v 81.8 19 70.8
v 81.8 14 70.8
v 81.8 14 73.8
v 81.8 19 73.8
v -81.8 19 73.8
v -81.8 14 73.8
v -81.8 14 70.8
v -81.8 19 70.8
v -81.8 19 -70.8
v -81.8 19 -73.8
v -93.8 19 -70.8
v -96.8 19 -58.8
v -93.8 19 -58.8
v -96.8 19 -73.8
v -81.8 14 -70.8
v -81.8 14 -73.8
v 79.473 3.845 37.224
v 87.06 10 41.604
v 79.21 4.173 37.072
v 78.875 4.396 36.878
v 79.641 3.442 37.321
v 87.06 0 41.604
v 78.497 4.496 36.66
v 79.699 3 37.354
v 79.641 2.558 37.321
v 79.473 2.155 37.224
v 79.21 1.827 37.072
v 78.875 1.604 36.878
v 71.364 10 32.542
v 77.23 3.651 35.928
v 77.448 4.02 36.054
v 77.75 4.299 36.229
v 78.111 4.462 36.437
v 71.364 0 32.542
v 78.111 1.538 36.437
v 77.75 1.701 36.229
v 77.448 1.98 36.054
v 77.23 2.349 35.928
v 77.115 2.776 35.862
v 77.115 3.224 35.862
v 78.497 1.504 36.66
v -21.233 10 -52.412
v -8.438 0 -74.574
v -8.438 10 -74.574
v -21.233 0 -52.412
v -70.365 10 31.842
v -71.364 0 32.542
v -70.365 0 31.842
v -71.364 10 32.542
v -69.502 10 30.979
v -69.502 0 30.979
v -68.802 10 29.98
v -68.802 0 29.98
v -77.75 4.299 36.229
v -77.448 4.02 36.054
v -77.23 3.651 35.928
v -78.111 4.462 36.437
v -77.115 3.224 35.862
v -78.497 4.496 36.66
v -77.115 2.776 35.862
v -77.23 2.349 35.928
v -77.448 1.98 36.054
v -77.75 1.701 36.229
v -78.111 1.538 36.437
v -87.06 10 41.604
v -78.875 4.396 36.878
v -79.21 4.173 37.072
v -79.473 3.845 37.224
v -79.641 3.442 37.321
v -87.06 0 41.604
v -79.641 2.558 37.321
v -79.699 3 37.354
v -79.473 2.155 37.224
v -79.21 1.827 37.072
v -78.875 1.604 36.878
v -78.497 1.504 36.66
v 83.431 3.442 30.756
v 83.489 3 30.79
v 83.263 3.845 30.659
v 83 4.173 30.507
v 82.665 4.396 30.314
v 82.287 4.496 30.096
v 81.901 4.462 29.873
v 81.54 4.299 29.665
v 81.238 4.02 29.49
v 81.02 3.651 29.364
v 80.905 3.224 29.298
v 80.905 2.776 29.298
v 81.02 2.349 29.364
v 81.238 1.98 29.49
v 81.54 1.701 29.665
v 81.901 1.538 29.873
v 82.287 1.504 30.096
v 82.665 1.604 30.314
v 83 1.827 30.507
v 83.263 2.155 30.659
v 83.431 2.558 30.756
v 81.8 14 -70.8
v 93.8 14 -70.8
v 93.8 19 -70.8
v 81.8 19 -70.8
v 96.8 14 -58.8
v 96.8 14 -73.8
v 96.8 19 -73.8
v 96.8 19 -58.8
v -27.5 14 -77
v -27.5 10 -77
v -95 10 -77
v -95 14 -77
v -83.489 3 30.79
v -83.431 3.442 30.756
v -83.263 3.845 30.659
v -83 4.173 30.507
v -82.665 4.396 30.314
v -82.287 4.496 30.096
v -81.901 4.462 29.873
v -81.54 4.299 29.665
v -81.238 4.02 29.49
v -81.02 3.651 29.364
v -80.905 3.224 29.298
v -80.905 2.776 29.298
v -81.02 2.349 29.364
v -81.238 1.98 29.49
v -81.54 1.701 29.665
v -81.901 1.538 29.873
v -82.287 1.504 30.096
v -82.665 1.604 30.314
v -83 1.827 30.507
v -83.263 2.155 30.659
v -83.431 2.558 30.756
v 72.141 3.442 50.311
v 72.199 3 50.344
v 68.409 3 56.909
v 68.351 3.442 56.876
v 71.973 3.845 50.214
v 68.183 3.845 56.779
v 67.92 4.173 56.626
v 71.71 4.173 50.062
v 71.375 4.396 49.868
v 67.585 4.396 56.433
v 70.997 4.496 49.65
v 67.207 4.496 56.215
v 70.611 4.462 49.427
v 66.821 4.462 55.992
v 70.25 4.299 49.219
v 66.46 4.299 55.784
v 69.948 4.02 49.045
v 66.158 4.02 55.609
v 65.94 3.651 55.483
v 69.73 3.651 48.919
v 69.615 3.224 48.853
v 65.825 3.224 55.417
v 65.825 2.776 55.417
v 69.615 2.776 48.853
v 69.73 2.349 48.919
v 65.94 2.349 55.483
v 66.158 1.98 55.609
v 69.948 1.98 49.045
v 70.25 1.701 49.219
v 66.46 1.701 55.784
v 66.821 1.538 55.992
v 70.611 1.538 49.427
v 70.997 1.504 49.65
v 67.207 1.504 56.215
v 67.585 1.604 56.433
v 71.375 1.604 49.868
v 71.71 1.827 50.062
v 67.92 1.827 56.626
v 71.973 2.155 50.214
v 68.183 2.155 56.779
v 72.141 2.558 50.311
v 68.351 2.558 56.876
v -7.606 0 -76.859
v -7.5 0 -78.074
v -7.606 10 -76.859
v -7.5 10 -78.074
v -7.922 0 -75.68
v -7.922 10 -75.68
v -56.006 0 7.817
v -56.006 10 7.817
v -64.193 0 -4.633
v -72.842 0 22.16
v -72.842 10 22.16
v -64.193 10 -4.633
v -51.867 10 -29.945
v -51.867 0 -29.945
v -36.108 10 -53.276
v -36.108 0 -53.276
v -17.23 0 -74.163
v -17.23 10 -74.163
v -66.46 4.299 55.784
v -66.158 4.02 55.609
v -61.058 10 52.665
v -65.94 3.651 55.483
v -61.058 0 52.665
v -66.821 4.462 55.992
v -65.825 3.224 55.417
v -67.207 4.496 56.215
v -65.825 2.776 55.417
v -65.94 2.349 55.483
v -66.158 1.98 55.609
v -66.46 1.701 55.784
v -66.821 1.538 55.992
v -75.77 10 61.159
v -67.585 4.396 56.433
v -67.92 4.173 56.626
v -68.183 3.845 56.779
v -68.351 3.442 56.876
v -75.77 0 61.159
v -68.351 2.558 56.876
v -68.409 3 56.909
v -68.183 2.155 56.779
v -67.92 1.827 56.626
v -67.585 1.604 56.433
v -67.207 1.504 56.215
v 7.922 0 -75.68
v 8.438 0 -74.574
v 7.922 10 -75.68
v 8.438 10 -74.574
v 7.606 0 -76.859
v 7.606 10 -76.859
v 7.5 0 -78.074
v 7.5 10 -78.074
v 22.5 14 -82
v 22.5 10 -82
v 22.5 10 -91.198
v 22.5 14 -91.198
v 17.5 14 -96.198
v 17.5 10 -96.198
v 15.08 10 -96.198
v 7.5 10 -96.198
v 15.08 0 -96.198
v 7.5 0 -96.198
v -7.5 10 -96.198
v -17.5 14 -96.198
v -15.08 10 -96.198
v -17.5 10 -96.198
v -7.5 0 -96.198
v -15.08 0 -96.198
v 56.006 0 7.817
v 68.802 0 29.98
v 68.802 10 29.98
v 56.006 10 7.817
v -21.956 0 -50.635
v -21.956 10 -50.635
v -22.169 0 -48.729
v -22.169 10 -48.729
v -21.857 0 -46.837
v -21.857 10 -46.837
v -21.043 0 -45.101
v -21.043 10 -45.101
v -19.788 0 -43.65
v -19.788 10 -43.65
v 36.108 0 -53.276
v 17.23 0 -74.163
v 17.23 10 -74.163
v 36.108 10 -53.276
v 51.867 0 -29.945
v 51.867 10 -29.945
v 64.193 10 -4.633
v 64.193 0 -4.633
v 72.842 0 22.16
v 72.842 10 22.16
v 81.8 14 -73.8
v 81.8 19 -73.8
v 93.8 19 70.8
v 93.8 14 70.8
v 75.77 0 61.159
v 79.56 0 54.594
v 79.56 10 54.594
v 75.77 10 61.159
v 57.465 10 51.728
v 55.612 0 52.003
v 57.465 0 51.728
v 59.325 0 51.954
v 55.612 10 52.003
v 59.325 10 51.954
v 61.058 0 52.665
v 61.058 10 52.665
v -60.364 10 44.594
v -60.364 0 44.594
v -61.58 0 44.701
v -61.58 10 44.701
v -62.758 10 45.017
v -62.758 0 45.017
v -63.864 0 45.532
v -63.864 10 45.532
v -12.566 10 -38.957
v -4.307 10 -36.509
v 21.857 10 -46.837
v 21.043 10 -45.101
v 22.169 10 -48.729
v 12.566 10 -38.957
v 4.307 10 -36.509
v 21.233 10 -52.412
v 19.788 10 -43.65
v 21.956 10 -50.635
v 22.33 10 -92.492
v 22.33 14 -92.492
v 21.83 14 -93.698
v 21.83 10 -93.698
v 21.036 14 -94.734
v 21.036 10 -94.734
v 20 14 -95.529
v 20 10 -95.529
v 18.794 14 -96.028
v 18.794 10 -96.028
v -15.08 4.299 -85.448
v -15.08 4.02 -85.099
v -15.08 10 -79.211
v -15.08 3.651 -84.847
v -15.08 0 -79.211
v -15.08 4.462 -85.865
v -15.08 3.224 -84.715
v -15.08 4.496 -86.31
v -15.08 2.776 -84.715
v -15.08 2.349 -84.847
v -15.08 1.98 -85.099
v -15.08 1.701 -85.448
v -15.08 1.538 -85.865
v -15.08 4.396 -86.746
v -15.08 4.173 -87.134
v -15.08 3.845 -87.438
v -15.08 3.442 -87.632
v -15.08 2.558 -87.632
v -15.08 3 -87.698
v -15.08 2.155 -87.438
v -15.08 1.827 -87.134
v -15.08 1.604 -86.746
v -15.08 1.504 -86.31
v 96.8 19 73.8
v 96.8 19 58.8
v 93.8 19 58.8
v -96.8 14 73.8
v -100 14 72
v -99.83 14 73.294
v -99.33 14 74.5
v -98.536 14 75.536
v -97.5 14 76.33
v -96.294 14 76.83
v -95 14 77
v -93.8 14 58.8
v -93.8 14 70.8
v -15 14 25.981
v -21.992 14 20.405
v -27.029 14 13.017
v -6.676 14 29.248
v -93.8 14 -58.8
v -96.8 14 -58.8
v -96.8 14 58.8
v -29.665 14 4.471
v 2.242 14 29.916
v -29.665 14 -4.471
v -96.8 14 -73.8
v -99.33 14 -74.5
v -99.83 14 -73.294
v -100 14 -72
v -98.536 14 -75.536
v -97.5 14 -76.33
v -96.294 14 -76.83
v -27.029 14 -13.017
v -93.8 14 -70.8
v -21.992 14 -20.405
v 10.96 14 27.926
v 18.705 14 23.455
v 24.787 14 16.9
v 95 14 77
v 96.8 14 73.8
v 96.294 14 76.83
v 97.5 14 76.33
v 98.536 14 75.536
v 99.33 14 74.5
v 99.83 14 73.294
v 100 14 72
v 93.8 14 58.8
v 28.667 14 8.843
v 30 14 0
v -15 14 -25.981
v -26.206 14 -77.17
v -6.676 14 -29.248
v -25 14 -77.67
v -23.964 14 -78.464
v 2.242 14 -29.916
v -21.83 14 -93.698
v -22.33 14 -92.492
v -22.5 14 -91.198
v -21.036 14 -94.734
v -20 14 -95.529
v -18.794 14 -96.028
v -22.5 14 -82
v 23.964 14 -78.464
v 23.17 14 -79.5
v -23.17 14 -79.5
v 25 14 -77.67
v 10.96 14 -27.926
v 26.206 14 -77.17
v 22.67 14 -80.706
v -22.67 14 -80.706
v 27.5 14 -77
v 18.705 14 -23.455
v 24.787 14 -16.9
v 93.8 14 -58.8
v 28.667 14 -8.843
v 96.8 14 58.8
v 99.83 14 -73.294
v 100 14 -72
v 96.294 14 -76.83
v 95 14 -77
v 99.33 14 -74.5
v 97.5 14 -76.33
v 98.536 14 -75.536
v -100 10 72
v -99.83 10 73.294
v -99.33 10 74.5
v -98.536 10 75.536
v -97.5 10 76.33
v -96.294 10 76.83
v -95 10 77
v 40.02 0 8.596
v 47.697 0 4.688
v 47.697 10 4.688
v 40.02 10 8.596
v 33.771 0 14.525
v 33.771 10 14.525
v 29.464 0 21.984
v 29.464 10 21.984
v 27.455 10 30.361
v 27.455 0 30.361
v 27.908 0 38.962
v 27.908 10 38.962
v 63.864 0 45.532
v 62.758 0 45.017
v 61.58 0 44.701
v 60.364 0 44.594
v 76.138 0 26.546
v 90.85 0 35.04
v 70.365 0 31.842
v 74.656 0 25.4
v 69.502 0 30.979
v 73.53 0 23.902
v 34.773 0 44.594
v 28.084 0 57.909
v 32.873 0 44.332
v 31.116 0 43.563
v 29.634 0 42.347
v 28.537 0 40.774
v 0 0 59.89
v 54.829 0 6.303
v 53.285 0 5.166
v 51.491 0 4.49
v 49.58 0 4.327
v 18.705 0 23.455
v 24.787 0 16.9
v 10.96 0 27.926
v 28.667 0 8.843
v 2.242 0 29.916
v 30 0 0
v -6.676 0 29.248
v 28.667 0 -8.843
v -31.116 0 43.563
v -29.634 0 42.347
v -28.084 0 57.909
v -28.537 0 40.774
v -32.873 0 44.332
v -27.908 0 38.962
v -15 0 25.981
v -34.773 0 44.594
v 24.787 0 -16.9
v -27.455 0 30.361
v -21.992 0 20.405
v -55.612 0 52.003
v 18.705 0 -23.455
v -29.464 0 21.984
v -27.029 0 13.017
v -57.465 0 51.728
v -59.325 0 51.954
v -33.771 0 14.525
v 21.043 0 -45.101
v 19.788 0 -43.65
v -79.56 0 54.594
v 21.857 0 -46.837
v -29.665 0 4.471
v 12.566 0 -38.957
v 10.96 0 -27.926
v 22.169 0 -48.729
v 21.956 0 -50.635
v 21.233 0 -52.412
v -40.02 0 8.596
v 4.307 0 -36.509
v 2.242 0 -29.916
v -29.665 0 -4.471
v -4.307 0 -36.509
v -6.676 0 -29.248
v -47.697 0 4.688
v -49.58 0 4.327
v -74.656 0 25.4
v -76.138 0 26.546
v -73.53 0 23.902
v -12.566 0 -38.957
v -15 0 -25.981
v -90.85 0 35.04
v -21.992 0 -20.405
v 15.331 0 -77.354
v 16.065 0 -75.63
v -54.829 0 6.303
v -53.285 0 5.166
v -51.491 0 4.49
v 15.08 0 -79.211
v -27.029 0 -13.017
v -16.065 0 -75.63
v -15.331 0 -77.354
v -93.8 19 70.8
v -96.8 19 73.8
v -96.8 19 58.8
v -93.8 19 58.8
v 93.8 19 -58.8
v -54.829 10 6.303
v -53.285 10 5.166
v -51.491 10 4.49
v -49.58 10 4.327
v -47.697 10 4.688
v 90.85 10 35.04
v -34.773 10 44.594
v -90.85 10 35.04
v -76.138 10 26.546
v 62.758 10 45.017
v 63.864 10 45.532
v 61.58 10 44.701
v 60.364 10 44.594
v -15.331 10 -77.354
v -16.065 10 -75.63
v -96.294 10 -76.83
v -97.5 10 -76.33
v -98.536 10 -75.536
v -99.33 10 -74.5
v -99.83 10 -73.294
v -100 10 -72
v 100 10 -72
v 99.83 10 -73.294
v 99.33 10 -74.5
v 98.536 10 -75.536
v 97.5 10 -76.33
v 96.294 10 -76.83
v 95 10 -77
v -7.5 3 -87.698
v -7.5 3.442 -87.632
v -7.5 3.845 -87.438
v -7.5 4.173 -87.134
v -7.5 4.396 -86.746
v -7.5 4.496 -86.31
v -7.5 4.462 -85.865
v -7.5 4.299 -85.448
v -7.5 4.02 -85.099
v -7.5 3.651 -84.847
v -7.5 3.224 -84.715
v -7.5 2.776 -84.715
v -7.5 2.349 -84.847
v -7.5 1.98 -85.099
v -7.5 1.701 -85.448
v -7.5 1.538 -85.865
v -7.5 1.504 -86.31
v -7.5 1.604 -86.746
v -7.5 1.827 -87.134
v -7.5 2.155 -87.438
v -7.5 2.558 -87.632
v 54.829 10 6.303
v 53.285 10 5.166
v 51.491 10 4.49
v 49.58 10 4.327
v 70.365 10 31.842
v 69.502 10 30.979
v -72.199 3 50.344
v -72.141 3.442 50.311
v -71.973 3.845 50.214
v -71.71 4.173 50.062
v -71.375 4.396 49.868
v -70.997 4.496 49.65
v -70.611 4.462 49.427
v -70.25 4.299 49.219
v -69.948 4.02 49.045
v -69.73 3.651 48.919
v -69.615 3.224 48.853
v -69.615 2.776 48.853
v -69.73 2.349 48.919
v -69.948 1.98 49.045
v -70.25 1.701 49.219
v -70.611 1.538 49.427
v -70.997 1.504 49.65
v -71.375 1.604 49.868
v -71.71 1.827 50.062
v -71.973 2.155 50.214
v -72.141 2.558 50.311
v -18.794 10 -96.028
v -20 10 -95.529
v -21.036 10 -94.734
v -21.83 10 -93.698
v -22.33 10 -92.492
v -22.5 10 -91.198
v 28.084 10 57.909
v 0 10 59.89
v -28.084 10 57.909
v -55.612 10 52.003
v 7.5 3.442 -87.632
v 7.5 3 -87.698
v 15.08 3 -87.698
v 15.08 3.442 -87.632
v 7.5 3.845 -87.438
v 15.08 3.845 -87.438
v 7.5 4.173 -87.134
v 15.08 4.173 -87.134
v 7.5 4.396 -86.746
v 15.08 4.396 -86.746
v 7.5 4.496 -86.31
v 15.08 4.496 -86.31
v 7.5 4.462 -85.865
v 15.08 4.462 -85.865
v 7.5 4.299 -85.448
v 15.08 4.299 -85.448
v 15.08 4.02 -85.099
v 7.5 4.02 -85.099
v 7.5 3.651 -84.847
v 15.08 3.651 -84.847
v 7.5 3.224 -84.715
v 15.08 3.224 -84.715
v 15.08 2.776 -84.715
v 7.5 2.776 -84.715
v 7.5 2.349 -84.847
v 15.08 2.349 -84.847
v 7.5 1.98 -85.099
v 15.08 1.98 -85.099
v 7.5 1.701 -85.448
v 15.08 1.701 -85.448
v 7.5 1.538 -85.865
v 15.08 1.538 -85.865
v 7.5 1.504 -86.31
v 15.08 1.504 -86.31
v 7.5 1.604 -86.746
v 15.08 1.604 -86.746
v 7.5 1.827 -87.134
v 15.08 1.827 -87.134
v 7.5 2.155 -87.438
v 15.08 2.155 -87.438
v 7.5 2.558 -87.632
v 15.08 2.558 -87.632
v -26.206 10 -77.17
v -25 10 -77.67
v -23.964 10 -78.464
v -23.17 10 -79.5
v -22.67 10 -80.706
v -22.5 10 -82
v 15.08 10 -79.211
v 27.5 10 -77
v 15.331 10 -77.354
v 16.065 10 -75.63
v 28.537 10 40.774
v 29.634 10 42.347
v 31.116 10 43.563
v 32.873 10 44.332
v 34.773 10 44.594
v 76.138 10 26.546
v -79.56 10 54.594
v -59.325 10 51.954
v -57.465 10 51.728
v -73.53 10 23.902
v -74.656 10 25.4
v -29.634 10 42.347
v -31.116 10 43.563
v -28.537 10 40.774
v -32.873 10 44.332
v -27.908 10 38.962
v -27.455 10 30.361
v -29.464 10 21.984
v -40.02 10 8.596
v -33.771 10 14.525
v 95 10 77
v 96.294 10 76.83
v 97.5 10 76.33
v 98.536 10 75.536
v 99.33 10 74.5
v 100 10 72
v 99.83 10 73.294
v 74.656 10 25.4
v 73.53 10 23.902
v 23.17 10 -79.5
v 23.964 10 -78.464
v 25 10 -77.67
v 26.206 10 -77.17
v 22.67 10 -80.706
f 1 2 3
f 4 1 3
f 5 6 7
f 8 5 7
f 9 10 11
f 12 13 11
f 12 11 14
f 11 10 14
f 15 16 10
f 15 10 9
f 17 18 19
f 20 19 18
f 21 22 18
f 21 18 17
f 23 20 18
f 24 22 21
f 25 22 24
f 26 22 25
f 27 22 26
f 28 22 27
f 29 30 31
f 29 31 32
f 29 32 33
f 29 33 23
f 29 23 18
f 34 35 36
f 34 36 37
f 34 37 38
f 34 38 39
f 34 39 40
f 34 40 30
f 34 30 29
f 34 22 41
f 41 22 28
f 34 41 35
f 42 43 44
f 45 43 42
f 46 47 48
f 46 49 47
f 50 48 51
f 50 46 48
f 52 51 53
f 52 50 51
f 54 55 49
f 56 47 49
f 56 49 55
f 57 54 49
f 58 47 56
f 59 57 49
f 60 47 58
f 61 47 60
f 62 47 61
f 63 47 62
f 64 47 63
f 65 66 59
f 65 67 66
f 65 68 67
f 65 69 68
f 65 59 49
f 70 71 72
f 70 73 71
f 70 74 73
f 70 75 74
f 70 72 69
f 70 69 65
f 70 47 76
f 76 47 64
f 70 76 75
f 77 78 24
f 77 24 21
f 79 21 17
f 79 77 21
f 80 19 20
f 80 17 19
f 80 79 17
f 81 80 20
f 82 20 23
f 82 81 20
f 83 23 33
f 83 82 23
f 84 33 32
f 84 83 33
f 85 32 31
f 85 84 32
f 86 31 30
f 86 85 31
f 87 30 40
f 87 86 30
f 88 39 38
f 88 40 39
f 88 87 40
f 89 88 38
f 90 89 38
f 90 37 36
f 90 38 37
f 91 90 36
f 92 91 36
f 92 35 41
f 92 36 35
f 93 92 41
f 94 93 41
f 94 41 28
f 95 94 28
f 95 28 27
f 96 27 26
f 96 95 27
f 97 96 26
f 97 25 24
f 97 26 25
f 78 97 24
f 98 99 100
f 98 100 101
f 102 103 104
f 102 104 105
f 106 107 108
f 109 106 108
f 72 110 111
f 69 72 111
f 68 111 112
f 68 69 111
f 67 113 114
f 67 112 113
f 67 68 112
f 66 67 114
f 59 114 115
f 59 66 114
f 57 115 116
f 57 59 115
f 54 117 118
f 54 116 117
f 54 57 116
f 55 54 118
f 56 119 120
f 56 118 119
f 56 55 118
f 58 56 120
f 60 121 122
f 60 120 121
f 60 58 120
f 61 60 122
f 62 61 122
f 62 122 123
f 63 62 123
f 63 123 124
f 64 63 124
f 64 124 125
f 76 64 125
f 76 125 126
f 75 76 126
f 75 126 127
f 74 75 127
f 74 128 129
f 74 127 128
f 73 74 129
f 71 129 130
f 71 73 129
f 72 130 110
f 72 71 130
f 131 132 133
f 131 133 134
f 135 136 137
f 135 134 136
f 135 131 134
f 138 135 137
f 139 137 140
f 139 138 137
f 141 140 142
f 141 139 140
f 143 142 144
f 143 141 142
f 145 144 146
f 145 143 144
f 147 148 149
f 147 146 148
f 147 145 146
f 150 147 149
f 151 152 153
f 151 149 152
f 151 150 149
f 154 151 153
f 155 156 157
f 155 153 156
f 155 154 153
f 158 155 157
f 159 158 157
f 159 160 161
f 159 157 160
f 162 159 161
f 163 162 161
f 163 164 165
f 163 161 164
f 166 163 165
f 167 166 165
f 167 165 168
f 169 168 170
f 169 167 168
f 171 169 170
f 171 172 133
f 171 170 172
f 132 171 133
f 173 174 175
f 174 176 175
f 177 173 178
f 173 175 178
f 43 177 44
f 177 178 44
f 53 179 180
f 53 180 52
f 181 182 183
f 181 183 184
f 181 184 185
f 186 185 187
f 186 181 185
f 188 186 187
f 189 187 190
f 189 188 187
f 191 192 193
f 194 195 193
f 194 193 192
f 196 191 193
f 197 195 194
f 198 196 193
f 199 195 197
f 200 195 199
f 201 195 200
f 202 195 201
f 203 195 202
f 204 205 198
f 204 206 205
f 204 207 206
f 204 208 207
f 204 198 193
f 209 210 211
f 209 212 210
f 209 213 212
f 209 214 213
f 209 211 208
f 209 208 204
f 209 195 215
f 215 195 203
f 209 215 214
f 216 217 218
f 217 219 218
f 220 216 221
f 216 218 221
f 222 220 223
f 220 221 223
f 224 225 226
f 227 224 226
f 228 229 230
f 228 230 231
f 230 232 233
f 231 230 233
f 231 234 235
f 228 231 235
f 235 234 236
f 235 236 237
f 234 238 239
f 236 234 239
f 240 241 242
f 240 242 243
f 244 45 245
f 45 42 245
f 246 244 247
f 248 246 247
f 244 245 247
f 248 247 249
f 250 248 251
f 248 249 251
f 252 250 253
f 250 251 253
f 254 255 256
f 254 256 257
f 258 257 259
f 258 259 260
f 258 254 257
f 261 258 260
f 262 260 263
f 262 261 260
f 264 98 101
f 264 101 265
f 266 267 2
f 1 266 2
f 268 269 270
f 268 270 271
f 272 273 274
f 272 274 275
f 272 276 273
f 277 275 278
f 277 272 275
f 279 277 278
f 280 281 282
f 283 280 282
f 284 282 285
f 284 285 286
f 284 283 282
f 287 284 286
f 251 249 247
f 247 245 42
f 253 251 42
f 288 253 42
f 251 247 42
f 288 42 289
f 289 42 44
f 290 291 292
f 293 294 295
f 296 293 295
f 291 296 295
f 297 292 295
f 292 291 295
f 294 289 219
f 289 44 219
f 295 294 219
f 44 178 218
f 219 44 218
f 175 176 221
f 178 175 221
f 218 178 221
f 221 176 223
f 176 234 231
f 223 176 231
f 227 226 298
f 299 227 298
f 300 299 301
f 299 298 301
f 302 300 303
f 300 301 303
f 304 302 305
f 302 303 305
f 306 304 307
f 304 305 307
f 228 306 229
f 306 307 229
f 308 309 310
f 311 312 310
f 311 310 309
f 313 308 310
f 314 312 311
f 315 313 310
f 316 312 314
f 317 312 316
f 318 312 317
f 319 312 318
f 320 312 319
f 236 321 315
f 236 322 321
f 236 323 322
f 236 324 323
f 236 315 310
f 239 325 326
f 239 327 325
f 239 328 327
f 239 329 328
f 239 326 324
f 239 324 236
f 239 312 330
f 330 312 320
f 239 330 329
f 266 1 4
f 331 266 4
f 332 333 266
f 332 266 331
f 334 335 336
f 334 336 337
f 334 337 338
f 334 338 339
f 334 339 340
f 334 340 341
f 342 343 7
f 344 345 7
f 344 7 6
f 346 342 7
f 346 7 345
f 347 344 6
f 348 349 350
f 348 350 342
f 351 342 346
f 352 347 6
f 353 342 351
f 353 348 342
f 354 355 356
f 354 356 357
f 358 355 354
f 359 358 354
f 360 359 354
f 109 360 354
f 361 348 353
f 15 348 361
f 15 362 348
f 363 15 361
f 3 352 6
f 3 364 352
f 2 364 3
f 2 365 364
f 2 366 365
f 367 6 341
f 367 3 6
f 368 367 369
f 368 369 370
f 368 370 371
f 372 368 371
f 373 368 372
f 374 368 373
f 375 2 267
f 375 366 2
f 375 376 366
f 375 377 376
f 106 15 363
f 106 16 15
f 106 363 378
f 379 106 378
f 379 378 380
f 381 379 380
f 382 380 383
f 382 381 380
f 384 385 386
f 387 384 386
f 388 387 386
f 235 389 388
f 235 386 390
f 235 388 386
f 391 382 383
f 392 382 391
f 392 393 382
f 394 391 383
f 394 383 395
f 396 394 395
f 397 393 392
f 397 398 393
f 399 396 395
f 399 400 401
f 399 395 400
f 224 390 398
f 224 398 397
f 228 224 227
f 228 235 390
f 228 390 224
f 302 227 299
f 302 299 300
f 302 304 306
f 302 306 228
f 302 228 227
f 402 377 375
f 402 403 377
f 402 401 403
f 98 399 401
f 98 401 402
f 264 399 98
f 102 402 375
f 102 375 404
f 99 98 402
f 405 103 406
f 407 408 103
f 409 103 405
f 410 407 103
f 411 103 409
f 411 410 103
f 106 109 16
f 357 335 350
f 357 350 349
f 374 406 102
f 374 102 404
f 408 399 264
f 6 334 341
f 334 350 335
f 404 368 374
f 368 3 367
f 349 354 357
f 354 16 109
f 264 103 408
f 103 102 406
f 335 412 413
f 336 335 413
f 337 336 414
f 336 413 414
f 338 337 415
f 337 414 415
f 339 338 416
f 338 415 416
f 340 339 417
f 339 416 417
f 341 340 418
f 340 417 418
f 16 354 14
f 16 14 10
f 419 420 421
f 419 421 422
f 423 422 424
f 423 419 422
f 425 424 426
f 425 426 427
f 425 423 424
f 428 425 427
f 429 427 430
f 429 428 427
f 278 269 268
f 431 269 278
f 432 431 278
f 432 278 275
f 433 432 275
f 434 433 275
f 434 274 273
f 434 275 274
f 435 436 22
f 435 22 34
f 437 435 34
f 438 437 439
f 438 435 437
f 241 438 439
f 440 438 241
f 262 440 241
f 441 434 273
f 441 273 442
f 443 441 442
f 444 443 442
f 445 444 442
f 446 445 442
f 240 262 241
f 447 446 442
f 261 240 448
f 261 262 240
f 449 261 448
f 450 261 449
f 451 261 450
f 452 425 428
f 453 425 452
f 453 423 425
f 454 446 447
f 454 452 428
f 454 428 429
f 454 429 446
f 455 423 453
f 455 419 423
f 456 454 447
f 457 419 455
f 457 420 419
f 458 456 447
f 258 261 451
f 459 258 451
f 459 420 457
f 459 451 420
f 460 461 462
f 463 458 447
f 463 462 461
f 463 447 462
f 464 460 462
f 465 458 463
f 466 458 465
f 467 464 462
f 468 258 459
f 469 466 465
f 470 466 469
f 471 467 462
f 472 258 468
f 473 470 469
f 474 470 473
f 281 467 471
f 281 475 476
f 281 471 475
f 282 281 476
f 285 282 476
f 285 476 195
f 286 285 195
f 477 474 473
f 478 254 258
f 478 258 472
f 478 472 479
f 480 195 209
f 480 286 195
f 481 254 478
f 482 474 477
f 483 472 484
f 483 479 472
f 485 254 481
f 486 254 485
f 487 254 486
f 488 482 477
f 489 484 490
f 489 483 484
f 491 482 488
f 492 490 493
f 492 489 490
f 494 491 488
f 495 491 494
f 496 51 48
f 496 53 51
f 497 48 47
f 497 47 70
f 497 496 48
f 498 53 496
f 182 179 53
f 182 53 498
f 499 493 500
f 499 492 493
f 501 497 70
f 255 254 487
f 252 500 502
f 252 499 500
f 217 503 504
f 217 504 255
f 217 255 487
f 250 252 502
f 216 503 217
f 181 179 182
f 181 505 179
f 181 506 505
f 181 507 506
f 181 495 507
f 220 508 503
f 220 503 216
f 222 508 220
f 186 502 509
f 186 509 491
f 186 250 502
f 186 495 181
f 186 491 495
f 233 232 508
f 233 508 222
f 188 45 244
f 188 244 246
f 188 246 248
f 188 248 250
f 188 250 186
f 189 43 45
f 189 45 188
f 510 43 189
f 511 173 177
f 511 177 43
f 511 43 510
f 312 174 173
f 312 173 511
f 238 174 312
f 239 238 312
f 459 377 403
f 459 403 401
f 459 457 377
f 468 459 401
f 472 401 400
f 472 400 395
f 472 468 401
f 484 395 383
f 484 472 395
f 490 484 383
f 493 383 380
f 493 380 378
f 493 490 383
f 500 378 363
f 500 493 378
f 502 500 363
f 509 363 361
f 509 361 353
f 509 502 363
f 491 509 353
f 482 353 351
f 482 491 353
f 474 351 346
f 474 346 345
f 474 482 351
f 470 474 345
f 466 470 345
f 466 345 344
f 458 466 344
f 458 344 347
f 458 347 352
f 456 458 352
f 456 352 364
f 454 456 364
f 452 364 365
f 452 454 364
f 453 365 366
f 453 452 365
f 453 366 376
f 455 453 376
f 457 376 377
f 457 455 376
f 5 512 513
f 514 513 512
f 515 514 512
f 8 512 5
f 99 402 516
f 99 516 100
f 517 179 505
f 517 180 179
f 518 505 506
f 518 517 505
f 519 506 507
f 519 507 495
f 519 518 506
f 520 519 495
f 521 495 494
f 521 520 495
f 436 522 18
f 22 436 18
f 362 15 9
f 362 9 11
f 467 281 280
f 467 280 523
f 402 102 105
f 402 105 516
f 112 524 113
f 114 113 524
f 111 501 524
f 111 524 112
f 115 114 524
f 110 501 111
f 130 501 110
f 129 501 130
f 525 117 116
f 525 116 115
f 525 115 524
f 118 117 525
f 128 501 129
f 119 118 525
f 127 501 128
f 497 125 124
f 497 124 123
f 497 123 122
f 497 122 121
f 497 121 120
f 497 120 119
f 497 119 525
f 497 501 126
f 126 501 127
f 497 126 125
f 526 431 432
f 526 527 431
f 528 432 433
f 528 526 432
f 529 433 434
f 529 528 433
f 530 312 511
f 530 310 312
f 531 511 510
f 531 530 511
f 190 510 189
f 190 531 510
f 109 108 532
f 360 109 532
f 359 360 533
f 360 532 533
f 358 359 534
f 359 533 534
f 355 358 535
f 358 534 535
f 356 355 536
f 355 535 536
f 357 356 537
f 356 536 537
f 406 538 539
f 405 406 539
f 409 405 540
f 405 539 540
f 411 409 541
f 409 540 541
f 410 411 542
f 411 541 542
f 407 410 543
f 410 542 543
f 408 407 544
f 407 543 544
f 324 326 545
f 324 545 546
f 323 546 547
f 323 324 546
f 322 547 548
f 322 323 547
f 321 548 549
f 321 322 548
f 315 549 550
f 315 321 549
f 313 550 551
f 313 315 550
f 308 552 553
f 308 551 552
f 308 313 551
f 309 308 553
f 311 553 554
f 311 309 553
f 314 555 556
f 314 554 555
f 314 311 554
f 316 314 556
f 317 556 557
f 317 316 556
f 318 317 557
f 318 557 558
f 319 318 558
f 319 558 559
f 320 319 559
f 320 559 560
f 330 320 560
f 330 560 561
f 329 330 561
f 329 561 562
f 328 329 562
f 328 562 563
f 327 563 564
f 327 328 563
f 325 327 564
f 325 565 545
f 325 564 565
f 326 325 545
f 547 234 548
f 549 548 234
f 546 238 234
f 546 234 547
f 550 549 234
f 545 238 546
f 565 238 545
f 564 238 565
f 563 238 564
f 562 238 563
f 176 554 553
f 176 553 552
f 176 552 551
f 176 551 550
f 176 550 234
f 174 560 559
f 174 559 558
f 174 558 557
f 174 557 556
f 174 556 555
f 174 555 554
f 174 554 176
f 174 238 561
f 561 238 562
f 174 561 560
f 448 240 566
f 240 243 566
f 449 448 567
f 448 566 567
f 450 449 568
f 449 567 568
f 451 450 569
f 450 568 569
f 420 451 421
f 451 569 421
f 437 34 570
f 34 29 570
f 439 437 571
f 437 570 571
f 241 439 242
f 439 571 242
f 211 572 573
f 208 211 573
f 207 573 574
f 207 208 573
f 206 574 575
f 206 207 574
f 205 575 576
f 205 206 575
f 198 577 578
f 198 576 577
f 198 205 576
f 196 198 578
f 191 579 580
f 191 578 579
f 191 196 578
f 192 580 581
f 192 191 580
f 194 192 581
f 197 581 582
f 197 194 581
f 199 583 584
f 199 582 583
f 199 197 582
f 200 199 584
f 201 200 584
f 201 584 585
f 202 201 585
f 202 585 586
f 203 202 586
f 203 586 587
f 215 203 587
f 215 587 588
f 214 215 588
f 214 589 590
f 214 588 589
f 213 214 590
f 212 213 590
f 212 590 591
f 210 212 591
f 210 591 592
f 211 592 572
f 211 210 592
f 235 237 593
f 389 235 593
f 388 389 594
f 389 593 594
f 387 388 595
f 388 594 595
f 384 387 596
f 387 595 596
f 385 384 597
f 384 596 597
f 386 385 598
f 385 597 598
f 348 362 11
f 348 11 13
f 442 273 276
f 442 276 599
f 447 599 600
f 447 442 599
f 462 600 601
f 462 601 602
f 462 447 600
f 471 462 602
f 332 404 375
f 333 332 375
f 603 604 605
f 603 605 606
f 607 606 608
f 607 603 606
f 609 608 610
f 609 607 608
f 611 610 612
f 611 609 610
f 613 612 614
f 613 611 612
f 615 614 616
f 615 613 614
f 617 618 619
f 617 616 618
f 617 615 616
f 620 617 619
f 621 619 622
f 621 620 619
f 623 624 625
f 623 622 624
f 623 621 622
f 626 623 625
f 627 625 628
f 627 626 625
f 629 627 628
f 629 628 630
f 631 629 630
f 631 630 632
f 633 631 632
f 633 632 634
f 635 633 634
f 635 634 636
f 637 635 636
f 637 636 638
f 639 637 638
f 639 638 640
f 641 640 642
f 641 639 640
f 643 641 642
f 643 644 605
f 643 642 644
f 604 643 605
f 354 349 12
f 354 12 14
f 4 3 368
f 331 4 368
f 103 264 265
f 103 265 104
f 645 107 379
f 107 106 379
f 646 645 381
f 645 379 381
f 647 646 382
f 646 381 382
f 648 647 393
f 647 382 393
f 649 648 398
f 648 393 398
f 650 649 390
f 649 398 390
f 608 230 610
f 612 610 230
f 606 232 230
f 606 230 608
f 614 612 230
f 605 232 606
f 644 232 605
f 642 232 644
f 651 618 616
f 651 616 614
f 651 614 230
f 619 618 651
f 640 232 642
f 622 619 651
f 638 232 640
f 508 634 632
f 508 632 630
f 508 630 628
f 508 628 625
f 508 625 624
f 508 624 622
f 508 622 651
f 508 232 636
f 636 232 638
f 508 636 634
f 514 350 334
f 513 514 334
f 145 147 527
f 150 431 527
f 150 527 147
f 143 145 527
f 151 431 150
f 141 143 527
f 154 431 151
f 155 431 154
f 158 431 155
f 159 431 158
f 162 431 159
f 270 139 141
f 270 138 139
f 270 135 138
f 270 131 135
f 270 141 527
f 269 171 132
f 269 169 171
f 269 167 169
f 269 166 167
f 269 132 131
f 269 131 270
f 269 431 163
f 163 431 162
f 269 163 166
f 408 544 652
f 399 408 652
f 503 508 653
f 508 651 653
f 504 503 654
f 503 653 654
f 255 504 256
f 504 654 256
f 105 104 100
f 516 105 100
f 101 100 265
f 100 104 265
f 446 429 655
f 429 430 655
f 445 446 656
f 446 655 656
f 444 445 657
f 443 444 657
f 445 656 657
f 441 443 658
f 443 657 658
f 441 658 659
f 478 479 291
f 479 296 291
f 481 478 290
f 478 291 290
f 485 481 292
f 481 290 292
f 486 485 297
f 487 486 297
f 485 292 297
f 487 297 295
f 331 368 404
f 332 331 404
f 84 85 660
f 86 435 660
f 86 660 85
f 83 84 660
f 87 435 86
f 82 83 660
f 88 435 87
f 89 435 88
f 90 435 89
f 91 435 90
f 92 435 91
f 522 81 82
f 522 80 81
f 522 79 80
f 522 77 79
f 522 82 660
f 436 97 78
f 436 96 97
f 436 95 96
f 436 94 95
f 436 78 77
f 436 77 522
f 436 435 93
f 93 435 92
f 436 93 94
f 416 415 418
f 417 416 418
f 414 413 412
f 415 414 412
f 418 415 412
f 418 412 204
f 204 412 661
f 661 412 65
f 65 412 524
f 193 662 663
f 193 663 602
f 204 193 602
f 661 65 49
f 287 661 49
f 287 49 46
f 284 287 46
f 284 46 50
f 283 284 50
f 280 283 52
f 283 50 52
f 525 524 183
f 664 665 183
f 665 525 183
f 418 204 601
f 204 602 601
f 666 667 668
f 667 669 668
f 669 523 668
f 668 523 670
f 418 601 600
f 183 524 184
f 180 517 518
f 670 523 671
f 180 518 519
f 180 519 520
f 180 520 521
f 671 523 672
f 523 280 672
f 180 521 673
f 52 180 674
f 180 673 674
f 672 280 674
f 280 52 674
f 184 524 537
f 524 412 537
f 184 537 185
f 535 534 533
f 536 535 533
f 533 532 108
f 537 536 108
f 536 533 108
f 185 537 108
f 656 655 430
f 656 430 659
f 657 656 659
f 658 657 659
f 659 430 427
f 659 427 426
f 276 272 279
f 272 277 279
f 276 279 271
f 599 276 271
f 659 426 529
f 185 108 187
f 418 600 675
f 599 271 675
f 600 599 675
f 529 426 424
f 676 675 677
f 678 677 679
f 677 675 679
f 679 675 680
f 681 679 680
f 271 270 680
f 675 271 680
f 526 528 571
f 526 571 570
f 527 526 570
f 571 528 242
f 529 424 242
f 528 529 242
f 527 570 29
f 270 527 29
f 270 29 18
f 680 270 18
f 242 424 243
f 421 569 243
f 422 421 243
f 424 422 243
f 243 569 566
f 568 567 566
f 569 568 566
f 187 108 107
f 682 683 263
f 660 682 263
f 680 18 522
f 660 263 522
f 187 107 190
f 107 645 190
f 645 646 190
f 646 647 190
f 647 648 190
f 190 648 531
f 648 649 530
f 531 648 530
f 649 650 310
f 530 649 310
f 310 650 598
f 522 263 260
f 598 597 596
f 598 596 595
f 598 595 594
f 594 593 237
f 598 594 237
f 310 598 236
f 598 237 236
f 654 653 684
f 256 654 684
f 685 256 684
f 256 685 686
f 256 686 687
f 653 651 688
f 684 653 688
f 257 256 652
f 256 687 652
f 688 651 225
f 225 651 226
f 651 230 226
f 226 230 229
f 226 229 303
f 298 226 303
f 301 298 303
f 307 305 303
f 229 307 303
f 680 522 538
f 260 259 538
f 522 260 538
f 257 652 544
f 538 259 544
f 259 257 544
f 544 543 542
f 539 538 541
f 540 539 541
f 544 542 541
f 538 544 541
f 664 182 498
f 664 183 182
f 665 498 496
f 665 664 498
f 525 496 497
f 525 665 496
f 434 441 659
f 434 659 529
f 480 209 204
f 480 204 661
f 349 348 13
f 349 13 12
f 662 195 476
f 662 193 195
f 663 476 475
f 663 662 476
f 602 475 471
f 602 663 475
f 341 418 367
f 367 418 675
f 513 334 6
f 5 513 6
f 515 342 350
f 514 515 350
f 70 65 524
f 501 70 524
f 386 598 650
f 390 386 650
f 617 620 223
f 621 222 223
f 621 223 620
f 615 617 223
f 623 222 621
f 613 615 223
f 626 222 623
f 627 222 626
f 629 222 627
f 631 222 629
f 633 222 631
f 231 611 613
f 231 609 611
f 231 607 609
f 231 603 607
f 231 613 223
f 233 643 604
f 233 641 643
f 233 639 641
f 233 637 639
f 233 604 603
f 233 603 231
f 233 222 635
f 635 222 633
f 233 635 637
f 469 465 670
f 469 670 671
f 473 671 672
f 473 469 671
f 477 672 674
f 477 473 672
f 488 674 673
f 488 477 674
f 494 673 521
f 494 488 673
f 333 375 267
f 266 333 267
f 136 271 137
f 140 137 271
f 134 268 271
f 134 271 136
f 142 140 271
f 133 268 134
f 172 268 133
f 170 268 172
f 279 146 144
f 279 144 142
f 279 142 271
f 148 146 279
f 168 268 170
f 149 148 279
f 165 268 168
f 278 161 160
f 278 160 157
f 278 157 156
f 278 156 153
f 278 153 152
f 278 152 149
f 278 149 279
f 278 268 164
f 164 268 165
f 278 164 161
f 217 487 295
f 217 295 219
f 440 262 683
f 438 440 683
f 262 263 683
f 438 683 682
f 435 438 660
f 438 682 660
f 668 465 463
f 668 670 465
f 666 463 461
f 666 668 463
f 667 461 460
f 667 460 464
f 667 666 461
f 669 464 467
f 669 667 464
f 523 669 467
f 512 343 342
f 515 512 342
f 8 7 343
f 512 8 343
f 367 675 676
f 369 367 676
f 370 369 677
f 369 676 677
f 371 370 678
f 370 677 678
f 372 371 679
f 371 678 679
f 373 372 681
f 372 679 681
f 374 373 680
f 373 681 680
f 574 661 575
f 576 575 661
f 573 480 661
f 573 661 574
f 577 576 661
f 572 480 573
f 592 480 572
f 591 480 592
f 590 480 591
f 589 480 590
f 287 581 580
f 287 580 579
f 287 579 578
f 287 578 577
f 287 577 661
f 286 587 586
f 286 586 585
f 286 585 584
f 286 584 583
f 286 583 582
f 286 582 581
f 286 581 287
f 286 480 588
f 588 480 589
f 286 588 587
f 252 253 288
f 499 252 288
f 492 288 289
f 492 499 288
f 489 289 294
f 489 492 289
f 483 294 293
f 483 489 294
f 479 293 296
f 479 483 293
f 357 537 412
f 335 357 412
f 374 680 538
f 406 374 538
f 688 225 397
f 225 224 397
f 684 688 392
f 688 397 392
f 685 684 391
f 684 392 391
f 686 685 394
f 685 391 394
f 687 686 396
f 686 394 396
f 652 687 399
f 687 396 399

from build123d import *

# Parameters (mm, degrees)
SKETCH1_R           = 30
BOSS_EXTRUDE1_DEPTH = 10
CUT_EXTRUDE1_START  = -106.930254038
SKETCH2_R           = 1.5
CUT_EXTRUDE1_DEPTH  = 183.700508076
CIRPATTERN1_COUNT   = 3
CIRPATTERN1_ANGLE   = 240
FILLET1_R           = 7
SKETCH4_R           = 30
BOSS_EXTRUDE4_DEPTH = 4
BOSS_EXTRUDE5_DEPTH = 5
FILLET4_R           = 5


with BuildPart() as part:
    # Sketch1 → Boss-Extrude1 (new body)
    with BuildSketch(Plane(origin=(0, 0, 0), x_dir=(1, 0, 0), z_dir=(0, 1, 0))):
        with BuildLine():
            Line((-15.08, 76.19839519), (-15.08, 96.19839519))
            Line((-15.08, 96.19839519), (-7.5, 96.19839519))
            Line((-7.5, 96.19839519), (-7.5, 76.19839519))
            Line((-7.5, 76.19839519), (-23.810275834, 47.948168761))
            ThreePointArc((-23.810275834, 47.948168761), (0, 36.19839519), (23.810275834, 47.948168761))
            Line((23.810275834, 47.948168761), (7.5, 76.19839519))
            Line((7.5, 76.19839519), (7.5, 96.19839519))
            Line((7.5, 96.19839519), (15.08, 96.19839519))
            Line((15.08, 96.19839519), (15.08, 76.19839519))
            ThreePointArc((15.08, 76.19839519), (51.866600724, 29.94519589), (73.529745962, -25.039534506))
            Line((73.529745962, -25.039534506), (90.850254038, -35.039534506))
            Line((90.850254038, -35.039534506), (87.060254038, -41.604007067))
            Line((87.060254038, -41.604007067), (69.739745962, -31.604007067))
            Line((69.739745962, -31.604007067), (53.429470128, -3.353780637))
            ThreePointArc((53.429470128, -3.353780637), (31.348729811, -18.099197595), (29.619194295, -44.594388123))
            Line((29.619194295, -44.594388123), (62.239745962, -44.594388123))
            Line((62.239745962, -44.594388123), (79.560254038, -54.594388123))
            Line((79.560254038, -54.594388123), (75.770254038, -61.158860684))
            Line((75.770254038, -61.158860684), (58.449745962, -51.158860684))
            ThreePointArc((58.449745962, -51.158860684), (0, -59.89039178), (-58.449745962, -51.158860684))
            Line((-58.449745962, -51.158860684), (-75.770254038, -61.158860684))
            Line((-75.770254038, -61.158860684), (-79.560254038, -54.594388123))
            Line((-79.560254038, -54.594388123), (-62.239745962, -44.594388123))
            Line((-62.239745962, -44.594388123), (-29.619194295, -44.594388123))
            ThreePointArc((-29.619194295, -44.594388123), (-31.348729811, -18.099197595), (-53.429470128, -3.353780637))
            Line((-53.429470128, -3.353780637), (-69.739745962, -31.604007067))
            Line((-69.739745962, -31.604007067), (-87.060254038, -41.604007067))
            Line((-87.060254038, -41.604007067), (-90.850254038, -35.039534506))
            Line((-90.850254038, -35.039534506), (-73.529745962, -25.039534506))
            ThreePointArc((-73.529745962, -25.039534506), (-51.866600724, 29.94519589), (-15.08, 76.19839519))
        make_face()
        Circle(SKETCH1_R, mode=Mode.SUBTRACT)
    extrude(amount=BOSS_EXTRUDE1_DEPTH)

    # Sketch2 → Cut-Extrude1 (cut)
    with BuildSketch(Plane(origin=(15.08, 0, 0), x_dir=(0, 0, -1), z_dir=(1, 0, 0)).offset(CUT_EXTRUDE1_START)):
        with Locations((86.19839519, 3)):
            Circle(SKETCH2_R)
    cut_extrude1 = extrude(amount=CUT_EXTRUDE1_DEPTH, mode=Mode.SUBTRACT)

    # CirPattern1: Cut-Extrude1 ×3 about axis
    cirpattern1_axis = Axis((0, 10, 0), (0, -1, 0))
    for i in range(1, CIRPATTERN1_COUNT):
        add(cut_extrude1.rotate(cirpattern1_axis, i * CIRPATTERN1_ANGLE / (CIRPATTERN1_COUNT - 1)), mode=Mode.SUBTRACT)

    # Fillet1
    fillet1_edges = [part.edges().sort_by_distance(p)[0] for p in [
        (-69.739745962, 5, 31.604007067),
        (-73.529745962, 5, 25.039534506),
        (-15.08, 5, -76.19839519),
        (-7.5, 5, -76.19839519),
        (-23.810275834, 5, -47.948168761),
        (23.810275834, 5, -47.948168761),
        (7.5, 5, -76.19839519),
        (15.08, 5, -76.19839519),
        (73.529745962, 5, 25.039534506),
        (69.739745962, 5, 31.604007067),
        (53.429470128, 5, 3.353780637),
        (29.619194295, 5, 44.594388123),
        (62.239745962, 5, 44.594388123),
        (58.449745962, 5, 51.158860684),
        (-58.449745962, 5, 51.158860684),
        (-62.239745962, 5, 44.594388123),
        (-29.619194295, 5, 44.594388123),
        (-53.429470128, 5, 3.353780637),
    ]]
    fillet(fillet1_edges, radius=FILLET1_R)

    # Sketch4 → Boss-Extrude4 (add)
    with BuildSketch(Plane(origin=(0, 10, 0), x_dir=(1, 0, 0), z_dir=(0, 1, 0))):
        with BuildLine():
            Line((-95, -77), (95, -77))
            ThreePointArc((95, -77), (98.535533906, -75.535533906), (100, -72))
            Line((100, -72), (100, 72))
            ThreePointArc((100, 72), (98.535533906, 75.535533906), (95, 77))
            Line((95, 77), (-95, 77))
            ThreePointArc((-95, 77), (-98.535533906, 75.535533906), (-100, 72))
            Line((-100, 72), (-100, -72))
            ThreePointArc((-100, -72), (-98.535533906, -75.535533906), (-95, -77))
        make_face()
        Circle(SKETCH4_R, mode=Mode.SUBTRACT)
        with BuildLine():
            Line((-22.5, 77), (22.5, 77))
            Line((22.5, 77), (22.5, 91.19839519))
            ThreePointArc((22.5, 91.19839519), (21.035533906, 94.733929096), (17.5, 96.19839519))
            Line((17.5, 96.19839519), (-17.5, 96.19839519))
            ThreePointArc((-17.5, 96.19839519), (-21.035533906, 94.733929096), (-22.5, 91.19839519))
            Line((-22.5, 91.19839519), (-22.5, 77))
        make_face()
    extrude(amount=BOSS_EXTRUDE4_DEPTH)

    # Sketch5 → Boss-Extrude5 (add)
    with BuildSketch(Plane(origin=(0, 14, 0), x_dir=(1, 0, 0), z_dir=(0, 1, 0))):
        Polygon((-96.8, 73.8), (-81.8, 73.8), (-81.8, 70.8), (-93.8, 70.8), (-93.8, 58.8), (-96.8, 58.8), align=None)
        Polygon((93.8, 70.8), (81.8, 70.8), (81.8, 73.8), (96.8, 73.8), (96.8, 58.8), (93.8, 58.8), align=None)
        Polygon((93.8, -58.8), (93.8, -70.8), (81.8, -70.8), (81.8, -73.8), (96.8, -73.8), (96.8, -58.8), align=None)
        Polygon((-93.8, -58.8), (-96.8, -58.8), (-96.8, -73.8), (-81.8, -73.8), (-81.8, -70.8), (-93.8, -70.8), align=None)
    extrude(amount=BOSS_EXTRUDE5_DEPTH)

    # Fillet4
    fillet4_edges = [part.edges().sort_by_distance(p)[0] for p in [
        (-22.5, 12, -77),
        (22.5, 12, -77),
    ]]
    fillet(fillet4_edges, radius=FILLET4_R)


solid = part.part
